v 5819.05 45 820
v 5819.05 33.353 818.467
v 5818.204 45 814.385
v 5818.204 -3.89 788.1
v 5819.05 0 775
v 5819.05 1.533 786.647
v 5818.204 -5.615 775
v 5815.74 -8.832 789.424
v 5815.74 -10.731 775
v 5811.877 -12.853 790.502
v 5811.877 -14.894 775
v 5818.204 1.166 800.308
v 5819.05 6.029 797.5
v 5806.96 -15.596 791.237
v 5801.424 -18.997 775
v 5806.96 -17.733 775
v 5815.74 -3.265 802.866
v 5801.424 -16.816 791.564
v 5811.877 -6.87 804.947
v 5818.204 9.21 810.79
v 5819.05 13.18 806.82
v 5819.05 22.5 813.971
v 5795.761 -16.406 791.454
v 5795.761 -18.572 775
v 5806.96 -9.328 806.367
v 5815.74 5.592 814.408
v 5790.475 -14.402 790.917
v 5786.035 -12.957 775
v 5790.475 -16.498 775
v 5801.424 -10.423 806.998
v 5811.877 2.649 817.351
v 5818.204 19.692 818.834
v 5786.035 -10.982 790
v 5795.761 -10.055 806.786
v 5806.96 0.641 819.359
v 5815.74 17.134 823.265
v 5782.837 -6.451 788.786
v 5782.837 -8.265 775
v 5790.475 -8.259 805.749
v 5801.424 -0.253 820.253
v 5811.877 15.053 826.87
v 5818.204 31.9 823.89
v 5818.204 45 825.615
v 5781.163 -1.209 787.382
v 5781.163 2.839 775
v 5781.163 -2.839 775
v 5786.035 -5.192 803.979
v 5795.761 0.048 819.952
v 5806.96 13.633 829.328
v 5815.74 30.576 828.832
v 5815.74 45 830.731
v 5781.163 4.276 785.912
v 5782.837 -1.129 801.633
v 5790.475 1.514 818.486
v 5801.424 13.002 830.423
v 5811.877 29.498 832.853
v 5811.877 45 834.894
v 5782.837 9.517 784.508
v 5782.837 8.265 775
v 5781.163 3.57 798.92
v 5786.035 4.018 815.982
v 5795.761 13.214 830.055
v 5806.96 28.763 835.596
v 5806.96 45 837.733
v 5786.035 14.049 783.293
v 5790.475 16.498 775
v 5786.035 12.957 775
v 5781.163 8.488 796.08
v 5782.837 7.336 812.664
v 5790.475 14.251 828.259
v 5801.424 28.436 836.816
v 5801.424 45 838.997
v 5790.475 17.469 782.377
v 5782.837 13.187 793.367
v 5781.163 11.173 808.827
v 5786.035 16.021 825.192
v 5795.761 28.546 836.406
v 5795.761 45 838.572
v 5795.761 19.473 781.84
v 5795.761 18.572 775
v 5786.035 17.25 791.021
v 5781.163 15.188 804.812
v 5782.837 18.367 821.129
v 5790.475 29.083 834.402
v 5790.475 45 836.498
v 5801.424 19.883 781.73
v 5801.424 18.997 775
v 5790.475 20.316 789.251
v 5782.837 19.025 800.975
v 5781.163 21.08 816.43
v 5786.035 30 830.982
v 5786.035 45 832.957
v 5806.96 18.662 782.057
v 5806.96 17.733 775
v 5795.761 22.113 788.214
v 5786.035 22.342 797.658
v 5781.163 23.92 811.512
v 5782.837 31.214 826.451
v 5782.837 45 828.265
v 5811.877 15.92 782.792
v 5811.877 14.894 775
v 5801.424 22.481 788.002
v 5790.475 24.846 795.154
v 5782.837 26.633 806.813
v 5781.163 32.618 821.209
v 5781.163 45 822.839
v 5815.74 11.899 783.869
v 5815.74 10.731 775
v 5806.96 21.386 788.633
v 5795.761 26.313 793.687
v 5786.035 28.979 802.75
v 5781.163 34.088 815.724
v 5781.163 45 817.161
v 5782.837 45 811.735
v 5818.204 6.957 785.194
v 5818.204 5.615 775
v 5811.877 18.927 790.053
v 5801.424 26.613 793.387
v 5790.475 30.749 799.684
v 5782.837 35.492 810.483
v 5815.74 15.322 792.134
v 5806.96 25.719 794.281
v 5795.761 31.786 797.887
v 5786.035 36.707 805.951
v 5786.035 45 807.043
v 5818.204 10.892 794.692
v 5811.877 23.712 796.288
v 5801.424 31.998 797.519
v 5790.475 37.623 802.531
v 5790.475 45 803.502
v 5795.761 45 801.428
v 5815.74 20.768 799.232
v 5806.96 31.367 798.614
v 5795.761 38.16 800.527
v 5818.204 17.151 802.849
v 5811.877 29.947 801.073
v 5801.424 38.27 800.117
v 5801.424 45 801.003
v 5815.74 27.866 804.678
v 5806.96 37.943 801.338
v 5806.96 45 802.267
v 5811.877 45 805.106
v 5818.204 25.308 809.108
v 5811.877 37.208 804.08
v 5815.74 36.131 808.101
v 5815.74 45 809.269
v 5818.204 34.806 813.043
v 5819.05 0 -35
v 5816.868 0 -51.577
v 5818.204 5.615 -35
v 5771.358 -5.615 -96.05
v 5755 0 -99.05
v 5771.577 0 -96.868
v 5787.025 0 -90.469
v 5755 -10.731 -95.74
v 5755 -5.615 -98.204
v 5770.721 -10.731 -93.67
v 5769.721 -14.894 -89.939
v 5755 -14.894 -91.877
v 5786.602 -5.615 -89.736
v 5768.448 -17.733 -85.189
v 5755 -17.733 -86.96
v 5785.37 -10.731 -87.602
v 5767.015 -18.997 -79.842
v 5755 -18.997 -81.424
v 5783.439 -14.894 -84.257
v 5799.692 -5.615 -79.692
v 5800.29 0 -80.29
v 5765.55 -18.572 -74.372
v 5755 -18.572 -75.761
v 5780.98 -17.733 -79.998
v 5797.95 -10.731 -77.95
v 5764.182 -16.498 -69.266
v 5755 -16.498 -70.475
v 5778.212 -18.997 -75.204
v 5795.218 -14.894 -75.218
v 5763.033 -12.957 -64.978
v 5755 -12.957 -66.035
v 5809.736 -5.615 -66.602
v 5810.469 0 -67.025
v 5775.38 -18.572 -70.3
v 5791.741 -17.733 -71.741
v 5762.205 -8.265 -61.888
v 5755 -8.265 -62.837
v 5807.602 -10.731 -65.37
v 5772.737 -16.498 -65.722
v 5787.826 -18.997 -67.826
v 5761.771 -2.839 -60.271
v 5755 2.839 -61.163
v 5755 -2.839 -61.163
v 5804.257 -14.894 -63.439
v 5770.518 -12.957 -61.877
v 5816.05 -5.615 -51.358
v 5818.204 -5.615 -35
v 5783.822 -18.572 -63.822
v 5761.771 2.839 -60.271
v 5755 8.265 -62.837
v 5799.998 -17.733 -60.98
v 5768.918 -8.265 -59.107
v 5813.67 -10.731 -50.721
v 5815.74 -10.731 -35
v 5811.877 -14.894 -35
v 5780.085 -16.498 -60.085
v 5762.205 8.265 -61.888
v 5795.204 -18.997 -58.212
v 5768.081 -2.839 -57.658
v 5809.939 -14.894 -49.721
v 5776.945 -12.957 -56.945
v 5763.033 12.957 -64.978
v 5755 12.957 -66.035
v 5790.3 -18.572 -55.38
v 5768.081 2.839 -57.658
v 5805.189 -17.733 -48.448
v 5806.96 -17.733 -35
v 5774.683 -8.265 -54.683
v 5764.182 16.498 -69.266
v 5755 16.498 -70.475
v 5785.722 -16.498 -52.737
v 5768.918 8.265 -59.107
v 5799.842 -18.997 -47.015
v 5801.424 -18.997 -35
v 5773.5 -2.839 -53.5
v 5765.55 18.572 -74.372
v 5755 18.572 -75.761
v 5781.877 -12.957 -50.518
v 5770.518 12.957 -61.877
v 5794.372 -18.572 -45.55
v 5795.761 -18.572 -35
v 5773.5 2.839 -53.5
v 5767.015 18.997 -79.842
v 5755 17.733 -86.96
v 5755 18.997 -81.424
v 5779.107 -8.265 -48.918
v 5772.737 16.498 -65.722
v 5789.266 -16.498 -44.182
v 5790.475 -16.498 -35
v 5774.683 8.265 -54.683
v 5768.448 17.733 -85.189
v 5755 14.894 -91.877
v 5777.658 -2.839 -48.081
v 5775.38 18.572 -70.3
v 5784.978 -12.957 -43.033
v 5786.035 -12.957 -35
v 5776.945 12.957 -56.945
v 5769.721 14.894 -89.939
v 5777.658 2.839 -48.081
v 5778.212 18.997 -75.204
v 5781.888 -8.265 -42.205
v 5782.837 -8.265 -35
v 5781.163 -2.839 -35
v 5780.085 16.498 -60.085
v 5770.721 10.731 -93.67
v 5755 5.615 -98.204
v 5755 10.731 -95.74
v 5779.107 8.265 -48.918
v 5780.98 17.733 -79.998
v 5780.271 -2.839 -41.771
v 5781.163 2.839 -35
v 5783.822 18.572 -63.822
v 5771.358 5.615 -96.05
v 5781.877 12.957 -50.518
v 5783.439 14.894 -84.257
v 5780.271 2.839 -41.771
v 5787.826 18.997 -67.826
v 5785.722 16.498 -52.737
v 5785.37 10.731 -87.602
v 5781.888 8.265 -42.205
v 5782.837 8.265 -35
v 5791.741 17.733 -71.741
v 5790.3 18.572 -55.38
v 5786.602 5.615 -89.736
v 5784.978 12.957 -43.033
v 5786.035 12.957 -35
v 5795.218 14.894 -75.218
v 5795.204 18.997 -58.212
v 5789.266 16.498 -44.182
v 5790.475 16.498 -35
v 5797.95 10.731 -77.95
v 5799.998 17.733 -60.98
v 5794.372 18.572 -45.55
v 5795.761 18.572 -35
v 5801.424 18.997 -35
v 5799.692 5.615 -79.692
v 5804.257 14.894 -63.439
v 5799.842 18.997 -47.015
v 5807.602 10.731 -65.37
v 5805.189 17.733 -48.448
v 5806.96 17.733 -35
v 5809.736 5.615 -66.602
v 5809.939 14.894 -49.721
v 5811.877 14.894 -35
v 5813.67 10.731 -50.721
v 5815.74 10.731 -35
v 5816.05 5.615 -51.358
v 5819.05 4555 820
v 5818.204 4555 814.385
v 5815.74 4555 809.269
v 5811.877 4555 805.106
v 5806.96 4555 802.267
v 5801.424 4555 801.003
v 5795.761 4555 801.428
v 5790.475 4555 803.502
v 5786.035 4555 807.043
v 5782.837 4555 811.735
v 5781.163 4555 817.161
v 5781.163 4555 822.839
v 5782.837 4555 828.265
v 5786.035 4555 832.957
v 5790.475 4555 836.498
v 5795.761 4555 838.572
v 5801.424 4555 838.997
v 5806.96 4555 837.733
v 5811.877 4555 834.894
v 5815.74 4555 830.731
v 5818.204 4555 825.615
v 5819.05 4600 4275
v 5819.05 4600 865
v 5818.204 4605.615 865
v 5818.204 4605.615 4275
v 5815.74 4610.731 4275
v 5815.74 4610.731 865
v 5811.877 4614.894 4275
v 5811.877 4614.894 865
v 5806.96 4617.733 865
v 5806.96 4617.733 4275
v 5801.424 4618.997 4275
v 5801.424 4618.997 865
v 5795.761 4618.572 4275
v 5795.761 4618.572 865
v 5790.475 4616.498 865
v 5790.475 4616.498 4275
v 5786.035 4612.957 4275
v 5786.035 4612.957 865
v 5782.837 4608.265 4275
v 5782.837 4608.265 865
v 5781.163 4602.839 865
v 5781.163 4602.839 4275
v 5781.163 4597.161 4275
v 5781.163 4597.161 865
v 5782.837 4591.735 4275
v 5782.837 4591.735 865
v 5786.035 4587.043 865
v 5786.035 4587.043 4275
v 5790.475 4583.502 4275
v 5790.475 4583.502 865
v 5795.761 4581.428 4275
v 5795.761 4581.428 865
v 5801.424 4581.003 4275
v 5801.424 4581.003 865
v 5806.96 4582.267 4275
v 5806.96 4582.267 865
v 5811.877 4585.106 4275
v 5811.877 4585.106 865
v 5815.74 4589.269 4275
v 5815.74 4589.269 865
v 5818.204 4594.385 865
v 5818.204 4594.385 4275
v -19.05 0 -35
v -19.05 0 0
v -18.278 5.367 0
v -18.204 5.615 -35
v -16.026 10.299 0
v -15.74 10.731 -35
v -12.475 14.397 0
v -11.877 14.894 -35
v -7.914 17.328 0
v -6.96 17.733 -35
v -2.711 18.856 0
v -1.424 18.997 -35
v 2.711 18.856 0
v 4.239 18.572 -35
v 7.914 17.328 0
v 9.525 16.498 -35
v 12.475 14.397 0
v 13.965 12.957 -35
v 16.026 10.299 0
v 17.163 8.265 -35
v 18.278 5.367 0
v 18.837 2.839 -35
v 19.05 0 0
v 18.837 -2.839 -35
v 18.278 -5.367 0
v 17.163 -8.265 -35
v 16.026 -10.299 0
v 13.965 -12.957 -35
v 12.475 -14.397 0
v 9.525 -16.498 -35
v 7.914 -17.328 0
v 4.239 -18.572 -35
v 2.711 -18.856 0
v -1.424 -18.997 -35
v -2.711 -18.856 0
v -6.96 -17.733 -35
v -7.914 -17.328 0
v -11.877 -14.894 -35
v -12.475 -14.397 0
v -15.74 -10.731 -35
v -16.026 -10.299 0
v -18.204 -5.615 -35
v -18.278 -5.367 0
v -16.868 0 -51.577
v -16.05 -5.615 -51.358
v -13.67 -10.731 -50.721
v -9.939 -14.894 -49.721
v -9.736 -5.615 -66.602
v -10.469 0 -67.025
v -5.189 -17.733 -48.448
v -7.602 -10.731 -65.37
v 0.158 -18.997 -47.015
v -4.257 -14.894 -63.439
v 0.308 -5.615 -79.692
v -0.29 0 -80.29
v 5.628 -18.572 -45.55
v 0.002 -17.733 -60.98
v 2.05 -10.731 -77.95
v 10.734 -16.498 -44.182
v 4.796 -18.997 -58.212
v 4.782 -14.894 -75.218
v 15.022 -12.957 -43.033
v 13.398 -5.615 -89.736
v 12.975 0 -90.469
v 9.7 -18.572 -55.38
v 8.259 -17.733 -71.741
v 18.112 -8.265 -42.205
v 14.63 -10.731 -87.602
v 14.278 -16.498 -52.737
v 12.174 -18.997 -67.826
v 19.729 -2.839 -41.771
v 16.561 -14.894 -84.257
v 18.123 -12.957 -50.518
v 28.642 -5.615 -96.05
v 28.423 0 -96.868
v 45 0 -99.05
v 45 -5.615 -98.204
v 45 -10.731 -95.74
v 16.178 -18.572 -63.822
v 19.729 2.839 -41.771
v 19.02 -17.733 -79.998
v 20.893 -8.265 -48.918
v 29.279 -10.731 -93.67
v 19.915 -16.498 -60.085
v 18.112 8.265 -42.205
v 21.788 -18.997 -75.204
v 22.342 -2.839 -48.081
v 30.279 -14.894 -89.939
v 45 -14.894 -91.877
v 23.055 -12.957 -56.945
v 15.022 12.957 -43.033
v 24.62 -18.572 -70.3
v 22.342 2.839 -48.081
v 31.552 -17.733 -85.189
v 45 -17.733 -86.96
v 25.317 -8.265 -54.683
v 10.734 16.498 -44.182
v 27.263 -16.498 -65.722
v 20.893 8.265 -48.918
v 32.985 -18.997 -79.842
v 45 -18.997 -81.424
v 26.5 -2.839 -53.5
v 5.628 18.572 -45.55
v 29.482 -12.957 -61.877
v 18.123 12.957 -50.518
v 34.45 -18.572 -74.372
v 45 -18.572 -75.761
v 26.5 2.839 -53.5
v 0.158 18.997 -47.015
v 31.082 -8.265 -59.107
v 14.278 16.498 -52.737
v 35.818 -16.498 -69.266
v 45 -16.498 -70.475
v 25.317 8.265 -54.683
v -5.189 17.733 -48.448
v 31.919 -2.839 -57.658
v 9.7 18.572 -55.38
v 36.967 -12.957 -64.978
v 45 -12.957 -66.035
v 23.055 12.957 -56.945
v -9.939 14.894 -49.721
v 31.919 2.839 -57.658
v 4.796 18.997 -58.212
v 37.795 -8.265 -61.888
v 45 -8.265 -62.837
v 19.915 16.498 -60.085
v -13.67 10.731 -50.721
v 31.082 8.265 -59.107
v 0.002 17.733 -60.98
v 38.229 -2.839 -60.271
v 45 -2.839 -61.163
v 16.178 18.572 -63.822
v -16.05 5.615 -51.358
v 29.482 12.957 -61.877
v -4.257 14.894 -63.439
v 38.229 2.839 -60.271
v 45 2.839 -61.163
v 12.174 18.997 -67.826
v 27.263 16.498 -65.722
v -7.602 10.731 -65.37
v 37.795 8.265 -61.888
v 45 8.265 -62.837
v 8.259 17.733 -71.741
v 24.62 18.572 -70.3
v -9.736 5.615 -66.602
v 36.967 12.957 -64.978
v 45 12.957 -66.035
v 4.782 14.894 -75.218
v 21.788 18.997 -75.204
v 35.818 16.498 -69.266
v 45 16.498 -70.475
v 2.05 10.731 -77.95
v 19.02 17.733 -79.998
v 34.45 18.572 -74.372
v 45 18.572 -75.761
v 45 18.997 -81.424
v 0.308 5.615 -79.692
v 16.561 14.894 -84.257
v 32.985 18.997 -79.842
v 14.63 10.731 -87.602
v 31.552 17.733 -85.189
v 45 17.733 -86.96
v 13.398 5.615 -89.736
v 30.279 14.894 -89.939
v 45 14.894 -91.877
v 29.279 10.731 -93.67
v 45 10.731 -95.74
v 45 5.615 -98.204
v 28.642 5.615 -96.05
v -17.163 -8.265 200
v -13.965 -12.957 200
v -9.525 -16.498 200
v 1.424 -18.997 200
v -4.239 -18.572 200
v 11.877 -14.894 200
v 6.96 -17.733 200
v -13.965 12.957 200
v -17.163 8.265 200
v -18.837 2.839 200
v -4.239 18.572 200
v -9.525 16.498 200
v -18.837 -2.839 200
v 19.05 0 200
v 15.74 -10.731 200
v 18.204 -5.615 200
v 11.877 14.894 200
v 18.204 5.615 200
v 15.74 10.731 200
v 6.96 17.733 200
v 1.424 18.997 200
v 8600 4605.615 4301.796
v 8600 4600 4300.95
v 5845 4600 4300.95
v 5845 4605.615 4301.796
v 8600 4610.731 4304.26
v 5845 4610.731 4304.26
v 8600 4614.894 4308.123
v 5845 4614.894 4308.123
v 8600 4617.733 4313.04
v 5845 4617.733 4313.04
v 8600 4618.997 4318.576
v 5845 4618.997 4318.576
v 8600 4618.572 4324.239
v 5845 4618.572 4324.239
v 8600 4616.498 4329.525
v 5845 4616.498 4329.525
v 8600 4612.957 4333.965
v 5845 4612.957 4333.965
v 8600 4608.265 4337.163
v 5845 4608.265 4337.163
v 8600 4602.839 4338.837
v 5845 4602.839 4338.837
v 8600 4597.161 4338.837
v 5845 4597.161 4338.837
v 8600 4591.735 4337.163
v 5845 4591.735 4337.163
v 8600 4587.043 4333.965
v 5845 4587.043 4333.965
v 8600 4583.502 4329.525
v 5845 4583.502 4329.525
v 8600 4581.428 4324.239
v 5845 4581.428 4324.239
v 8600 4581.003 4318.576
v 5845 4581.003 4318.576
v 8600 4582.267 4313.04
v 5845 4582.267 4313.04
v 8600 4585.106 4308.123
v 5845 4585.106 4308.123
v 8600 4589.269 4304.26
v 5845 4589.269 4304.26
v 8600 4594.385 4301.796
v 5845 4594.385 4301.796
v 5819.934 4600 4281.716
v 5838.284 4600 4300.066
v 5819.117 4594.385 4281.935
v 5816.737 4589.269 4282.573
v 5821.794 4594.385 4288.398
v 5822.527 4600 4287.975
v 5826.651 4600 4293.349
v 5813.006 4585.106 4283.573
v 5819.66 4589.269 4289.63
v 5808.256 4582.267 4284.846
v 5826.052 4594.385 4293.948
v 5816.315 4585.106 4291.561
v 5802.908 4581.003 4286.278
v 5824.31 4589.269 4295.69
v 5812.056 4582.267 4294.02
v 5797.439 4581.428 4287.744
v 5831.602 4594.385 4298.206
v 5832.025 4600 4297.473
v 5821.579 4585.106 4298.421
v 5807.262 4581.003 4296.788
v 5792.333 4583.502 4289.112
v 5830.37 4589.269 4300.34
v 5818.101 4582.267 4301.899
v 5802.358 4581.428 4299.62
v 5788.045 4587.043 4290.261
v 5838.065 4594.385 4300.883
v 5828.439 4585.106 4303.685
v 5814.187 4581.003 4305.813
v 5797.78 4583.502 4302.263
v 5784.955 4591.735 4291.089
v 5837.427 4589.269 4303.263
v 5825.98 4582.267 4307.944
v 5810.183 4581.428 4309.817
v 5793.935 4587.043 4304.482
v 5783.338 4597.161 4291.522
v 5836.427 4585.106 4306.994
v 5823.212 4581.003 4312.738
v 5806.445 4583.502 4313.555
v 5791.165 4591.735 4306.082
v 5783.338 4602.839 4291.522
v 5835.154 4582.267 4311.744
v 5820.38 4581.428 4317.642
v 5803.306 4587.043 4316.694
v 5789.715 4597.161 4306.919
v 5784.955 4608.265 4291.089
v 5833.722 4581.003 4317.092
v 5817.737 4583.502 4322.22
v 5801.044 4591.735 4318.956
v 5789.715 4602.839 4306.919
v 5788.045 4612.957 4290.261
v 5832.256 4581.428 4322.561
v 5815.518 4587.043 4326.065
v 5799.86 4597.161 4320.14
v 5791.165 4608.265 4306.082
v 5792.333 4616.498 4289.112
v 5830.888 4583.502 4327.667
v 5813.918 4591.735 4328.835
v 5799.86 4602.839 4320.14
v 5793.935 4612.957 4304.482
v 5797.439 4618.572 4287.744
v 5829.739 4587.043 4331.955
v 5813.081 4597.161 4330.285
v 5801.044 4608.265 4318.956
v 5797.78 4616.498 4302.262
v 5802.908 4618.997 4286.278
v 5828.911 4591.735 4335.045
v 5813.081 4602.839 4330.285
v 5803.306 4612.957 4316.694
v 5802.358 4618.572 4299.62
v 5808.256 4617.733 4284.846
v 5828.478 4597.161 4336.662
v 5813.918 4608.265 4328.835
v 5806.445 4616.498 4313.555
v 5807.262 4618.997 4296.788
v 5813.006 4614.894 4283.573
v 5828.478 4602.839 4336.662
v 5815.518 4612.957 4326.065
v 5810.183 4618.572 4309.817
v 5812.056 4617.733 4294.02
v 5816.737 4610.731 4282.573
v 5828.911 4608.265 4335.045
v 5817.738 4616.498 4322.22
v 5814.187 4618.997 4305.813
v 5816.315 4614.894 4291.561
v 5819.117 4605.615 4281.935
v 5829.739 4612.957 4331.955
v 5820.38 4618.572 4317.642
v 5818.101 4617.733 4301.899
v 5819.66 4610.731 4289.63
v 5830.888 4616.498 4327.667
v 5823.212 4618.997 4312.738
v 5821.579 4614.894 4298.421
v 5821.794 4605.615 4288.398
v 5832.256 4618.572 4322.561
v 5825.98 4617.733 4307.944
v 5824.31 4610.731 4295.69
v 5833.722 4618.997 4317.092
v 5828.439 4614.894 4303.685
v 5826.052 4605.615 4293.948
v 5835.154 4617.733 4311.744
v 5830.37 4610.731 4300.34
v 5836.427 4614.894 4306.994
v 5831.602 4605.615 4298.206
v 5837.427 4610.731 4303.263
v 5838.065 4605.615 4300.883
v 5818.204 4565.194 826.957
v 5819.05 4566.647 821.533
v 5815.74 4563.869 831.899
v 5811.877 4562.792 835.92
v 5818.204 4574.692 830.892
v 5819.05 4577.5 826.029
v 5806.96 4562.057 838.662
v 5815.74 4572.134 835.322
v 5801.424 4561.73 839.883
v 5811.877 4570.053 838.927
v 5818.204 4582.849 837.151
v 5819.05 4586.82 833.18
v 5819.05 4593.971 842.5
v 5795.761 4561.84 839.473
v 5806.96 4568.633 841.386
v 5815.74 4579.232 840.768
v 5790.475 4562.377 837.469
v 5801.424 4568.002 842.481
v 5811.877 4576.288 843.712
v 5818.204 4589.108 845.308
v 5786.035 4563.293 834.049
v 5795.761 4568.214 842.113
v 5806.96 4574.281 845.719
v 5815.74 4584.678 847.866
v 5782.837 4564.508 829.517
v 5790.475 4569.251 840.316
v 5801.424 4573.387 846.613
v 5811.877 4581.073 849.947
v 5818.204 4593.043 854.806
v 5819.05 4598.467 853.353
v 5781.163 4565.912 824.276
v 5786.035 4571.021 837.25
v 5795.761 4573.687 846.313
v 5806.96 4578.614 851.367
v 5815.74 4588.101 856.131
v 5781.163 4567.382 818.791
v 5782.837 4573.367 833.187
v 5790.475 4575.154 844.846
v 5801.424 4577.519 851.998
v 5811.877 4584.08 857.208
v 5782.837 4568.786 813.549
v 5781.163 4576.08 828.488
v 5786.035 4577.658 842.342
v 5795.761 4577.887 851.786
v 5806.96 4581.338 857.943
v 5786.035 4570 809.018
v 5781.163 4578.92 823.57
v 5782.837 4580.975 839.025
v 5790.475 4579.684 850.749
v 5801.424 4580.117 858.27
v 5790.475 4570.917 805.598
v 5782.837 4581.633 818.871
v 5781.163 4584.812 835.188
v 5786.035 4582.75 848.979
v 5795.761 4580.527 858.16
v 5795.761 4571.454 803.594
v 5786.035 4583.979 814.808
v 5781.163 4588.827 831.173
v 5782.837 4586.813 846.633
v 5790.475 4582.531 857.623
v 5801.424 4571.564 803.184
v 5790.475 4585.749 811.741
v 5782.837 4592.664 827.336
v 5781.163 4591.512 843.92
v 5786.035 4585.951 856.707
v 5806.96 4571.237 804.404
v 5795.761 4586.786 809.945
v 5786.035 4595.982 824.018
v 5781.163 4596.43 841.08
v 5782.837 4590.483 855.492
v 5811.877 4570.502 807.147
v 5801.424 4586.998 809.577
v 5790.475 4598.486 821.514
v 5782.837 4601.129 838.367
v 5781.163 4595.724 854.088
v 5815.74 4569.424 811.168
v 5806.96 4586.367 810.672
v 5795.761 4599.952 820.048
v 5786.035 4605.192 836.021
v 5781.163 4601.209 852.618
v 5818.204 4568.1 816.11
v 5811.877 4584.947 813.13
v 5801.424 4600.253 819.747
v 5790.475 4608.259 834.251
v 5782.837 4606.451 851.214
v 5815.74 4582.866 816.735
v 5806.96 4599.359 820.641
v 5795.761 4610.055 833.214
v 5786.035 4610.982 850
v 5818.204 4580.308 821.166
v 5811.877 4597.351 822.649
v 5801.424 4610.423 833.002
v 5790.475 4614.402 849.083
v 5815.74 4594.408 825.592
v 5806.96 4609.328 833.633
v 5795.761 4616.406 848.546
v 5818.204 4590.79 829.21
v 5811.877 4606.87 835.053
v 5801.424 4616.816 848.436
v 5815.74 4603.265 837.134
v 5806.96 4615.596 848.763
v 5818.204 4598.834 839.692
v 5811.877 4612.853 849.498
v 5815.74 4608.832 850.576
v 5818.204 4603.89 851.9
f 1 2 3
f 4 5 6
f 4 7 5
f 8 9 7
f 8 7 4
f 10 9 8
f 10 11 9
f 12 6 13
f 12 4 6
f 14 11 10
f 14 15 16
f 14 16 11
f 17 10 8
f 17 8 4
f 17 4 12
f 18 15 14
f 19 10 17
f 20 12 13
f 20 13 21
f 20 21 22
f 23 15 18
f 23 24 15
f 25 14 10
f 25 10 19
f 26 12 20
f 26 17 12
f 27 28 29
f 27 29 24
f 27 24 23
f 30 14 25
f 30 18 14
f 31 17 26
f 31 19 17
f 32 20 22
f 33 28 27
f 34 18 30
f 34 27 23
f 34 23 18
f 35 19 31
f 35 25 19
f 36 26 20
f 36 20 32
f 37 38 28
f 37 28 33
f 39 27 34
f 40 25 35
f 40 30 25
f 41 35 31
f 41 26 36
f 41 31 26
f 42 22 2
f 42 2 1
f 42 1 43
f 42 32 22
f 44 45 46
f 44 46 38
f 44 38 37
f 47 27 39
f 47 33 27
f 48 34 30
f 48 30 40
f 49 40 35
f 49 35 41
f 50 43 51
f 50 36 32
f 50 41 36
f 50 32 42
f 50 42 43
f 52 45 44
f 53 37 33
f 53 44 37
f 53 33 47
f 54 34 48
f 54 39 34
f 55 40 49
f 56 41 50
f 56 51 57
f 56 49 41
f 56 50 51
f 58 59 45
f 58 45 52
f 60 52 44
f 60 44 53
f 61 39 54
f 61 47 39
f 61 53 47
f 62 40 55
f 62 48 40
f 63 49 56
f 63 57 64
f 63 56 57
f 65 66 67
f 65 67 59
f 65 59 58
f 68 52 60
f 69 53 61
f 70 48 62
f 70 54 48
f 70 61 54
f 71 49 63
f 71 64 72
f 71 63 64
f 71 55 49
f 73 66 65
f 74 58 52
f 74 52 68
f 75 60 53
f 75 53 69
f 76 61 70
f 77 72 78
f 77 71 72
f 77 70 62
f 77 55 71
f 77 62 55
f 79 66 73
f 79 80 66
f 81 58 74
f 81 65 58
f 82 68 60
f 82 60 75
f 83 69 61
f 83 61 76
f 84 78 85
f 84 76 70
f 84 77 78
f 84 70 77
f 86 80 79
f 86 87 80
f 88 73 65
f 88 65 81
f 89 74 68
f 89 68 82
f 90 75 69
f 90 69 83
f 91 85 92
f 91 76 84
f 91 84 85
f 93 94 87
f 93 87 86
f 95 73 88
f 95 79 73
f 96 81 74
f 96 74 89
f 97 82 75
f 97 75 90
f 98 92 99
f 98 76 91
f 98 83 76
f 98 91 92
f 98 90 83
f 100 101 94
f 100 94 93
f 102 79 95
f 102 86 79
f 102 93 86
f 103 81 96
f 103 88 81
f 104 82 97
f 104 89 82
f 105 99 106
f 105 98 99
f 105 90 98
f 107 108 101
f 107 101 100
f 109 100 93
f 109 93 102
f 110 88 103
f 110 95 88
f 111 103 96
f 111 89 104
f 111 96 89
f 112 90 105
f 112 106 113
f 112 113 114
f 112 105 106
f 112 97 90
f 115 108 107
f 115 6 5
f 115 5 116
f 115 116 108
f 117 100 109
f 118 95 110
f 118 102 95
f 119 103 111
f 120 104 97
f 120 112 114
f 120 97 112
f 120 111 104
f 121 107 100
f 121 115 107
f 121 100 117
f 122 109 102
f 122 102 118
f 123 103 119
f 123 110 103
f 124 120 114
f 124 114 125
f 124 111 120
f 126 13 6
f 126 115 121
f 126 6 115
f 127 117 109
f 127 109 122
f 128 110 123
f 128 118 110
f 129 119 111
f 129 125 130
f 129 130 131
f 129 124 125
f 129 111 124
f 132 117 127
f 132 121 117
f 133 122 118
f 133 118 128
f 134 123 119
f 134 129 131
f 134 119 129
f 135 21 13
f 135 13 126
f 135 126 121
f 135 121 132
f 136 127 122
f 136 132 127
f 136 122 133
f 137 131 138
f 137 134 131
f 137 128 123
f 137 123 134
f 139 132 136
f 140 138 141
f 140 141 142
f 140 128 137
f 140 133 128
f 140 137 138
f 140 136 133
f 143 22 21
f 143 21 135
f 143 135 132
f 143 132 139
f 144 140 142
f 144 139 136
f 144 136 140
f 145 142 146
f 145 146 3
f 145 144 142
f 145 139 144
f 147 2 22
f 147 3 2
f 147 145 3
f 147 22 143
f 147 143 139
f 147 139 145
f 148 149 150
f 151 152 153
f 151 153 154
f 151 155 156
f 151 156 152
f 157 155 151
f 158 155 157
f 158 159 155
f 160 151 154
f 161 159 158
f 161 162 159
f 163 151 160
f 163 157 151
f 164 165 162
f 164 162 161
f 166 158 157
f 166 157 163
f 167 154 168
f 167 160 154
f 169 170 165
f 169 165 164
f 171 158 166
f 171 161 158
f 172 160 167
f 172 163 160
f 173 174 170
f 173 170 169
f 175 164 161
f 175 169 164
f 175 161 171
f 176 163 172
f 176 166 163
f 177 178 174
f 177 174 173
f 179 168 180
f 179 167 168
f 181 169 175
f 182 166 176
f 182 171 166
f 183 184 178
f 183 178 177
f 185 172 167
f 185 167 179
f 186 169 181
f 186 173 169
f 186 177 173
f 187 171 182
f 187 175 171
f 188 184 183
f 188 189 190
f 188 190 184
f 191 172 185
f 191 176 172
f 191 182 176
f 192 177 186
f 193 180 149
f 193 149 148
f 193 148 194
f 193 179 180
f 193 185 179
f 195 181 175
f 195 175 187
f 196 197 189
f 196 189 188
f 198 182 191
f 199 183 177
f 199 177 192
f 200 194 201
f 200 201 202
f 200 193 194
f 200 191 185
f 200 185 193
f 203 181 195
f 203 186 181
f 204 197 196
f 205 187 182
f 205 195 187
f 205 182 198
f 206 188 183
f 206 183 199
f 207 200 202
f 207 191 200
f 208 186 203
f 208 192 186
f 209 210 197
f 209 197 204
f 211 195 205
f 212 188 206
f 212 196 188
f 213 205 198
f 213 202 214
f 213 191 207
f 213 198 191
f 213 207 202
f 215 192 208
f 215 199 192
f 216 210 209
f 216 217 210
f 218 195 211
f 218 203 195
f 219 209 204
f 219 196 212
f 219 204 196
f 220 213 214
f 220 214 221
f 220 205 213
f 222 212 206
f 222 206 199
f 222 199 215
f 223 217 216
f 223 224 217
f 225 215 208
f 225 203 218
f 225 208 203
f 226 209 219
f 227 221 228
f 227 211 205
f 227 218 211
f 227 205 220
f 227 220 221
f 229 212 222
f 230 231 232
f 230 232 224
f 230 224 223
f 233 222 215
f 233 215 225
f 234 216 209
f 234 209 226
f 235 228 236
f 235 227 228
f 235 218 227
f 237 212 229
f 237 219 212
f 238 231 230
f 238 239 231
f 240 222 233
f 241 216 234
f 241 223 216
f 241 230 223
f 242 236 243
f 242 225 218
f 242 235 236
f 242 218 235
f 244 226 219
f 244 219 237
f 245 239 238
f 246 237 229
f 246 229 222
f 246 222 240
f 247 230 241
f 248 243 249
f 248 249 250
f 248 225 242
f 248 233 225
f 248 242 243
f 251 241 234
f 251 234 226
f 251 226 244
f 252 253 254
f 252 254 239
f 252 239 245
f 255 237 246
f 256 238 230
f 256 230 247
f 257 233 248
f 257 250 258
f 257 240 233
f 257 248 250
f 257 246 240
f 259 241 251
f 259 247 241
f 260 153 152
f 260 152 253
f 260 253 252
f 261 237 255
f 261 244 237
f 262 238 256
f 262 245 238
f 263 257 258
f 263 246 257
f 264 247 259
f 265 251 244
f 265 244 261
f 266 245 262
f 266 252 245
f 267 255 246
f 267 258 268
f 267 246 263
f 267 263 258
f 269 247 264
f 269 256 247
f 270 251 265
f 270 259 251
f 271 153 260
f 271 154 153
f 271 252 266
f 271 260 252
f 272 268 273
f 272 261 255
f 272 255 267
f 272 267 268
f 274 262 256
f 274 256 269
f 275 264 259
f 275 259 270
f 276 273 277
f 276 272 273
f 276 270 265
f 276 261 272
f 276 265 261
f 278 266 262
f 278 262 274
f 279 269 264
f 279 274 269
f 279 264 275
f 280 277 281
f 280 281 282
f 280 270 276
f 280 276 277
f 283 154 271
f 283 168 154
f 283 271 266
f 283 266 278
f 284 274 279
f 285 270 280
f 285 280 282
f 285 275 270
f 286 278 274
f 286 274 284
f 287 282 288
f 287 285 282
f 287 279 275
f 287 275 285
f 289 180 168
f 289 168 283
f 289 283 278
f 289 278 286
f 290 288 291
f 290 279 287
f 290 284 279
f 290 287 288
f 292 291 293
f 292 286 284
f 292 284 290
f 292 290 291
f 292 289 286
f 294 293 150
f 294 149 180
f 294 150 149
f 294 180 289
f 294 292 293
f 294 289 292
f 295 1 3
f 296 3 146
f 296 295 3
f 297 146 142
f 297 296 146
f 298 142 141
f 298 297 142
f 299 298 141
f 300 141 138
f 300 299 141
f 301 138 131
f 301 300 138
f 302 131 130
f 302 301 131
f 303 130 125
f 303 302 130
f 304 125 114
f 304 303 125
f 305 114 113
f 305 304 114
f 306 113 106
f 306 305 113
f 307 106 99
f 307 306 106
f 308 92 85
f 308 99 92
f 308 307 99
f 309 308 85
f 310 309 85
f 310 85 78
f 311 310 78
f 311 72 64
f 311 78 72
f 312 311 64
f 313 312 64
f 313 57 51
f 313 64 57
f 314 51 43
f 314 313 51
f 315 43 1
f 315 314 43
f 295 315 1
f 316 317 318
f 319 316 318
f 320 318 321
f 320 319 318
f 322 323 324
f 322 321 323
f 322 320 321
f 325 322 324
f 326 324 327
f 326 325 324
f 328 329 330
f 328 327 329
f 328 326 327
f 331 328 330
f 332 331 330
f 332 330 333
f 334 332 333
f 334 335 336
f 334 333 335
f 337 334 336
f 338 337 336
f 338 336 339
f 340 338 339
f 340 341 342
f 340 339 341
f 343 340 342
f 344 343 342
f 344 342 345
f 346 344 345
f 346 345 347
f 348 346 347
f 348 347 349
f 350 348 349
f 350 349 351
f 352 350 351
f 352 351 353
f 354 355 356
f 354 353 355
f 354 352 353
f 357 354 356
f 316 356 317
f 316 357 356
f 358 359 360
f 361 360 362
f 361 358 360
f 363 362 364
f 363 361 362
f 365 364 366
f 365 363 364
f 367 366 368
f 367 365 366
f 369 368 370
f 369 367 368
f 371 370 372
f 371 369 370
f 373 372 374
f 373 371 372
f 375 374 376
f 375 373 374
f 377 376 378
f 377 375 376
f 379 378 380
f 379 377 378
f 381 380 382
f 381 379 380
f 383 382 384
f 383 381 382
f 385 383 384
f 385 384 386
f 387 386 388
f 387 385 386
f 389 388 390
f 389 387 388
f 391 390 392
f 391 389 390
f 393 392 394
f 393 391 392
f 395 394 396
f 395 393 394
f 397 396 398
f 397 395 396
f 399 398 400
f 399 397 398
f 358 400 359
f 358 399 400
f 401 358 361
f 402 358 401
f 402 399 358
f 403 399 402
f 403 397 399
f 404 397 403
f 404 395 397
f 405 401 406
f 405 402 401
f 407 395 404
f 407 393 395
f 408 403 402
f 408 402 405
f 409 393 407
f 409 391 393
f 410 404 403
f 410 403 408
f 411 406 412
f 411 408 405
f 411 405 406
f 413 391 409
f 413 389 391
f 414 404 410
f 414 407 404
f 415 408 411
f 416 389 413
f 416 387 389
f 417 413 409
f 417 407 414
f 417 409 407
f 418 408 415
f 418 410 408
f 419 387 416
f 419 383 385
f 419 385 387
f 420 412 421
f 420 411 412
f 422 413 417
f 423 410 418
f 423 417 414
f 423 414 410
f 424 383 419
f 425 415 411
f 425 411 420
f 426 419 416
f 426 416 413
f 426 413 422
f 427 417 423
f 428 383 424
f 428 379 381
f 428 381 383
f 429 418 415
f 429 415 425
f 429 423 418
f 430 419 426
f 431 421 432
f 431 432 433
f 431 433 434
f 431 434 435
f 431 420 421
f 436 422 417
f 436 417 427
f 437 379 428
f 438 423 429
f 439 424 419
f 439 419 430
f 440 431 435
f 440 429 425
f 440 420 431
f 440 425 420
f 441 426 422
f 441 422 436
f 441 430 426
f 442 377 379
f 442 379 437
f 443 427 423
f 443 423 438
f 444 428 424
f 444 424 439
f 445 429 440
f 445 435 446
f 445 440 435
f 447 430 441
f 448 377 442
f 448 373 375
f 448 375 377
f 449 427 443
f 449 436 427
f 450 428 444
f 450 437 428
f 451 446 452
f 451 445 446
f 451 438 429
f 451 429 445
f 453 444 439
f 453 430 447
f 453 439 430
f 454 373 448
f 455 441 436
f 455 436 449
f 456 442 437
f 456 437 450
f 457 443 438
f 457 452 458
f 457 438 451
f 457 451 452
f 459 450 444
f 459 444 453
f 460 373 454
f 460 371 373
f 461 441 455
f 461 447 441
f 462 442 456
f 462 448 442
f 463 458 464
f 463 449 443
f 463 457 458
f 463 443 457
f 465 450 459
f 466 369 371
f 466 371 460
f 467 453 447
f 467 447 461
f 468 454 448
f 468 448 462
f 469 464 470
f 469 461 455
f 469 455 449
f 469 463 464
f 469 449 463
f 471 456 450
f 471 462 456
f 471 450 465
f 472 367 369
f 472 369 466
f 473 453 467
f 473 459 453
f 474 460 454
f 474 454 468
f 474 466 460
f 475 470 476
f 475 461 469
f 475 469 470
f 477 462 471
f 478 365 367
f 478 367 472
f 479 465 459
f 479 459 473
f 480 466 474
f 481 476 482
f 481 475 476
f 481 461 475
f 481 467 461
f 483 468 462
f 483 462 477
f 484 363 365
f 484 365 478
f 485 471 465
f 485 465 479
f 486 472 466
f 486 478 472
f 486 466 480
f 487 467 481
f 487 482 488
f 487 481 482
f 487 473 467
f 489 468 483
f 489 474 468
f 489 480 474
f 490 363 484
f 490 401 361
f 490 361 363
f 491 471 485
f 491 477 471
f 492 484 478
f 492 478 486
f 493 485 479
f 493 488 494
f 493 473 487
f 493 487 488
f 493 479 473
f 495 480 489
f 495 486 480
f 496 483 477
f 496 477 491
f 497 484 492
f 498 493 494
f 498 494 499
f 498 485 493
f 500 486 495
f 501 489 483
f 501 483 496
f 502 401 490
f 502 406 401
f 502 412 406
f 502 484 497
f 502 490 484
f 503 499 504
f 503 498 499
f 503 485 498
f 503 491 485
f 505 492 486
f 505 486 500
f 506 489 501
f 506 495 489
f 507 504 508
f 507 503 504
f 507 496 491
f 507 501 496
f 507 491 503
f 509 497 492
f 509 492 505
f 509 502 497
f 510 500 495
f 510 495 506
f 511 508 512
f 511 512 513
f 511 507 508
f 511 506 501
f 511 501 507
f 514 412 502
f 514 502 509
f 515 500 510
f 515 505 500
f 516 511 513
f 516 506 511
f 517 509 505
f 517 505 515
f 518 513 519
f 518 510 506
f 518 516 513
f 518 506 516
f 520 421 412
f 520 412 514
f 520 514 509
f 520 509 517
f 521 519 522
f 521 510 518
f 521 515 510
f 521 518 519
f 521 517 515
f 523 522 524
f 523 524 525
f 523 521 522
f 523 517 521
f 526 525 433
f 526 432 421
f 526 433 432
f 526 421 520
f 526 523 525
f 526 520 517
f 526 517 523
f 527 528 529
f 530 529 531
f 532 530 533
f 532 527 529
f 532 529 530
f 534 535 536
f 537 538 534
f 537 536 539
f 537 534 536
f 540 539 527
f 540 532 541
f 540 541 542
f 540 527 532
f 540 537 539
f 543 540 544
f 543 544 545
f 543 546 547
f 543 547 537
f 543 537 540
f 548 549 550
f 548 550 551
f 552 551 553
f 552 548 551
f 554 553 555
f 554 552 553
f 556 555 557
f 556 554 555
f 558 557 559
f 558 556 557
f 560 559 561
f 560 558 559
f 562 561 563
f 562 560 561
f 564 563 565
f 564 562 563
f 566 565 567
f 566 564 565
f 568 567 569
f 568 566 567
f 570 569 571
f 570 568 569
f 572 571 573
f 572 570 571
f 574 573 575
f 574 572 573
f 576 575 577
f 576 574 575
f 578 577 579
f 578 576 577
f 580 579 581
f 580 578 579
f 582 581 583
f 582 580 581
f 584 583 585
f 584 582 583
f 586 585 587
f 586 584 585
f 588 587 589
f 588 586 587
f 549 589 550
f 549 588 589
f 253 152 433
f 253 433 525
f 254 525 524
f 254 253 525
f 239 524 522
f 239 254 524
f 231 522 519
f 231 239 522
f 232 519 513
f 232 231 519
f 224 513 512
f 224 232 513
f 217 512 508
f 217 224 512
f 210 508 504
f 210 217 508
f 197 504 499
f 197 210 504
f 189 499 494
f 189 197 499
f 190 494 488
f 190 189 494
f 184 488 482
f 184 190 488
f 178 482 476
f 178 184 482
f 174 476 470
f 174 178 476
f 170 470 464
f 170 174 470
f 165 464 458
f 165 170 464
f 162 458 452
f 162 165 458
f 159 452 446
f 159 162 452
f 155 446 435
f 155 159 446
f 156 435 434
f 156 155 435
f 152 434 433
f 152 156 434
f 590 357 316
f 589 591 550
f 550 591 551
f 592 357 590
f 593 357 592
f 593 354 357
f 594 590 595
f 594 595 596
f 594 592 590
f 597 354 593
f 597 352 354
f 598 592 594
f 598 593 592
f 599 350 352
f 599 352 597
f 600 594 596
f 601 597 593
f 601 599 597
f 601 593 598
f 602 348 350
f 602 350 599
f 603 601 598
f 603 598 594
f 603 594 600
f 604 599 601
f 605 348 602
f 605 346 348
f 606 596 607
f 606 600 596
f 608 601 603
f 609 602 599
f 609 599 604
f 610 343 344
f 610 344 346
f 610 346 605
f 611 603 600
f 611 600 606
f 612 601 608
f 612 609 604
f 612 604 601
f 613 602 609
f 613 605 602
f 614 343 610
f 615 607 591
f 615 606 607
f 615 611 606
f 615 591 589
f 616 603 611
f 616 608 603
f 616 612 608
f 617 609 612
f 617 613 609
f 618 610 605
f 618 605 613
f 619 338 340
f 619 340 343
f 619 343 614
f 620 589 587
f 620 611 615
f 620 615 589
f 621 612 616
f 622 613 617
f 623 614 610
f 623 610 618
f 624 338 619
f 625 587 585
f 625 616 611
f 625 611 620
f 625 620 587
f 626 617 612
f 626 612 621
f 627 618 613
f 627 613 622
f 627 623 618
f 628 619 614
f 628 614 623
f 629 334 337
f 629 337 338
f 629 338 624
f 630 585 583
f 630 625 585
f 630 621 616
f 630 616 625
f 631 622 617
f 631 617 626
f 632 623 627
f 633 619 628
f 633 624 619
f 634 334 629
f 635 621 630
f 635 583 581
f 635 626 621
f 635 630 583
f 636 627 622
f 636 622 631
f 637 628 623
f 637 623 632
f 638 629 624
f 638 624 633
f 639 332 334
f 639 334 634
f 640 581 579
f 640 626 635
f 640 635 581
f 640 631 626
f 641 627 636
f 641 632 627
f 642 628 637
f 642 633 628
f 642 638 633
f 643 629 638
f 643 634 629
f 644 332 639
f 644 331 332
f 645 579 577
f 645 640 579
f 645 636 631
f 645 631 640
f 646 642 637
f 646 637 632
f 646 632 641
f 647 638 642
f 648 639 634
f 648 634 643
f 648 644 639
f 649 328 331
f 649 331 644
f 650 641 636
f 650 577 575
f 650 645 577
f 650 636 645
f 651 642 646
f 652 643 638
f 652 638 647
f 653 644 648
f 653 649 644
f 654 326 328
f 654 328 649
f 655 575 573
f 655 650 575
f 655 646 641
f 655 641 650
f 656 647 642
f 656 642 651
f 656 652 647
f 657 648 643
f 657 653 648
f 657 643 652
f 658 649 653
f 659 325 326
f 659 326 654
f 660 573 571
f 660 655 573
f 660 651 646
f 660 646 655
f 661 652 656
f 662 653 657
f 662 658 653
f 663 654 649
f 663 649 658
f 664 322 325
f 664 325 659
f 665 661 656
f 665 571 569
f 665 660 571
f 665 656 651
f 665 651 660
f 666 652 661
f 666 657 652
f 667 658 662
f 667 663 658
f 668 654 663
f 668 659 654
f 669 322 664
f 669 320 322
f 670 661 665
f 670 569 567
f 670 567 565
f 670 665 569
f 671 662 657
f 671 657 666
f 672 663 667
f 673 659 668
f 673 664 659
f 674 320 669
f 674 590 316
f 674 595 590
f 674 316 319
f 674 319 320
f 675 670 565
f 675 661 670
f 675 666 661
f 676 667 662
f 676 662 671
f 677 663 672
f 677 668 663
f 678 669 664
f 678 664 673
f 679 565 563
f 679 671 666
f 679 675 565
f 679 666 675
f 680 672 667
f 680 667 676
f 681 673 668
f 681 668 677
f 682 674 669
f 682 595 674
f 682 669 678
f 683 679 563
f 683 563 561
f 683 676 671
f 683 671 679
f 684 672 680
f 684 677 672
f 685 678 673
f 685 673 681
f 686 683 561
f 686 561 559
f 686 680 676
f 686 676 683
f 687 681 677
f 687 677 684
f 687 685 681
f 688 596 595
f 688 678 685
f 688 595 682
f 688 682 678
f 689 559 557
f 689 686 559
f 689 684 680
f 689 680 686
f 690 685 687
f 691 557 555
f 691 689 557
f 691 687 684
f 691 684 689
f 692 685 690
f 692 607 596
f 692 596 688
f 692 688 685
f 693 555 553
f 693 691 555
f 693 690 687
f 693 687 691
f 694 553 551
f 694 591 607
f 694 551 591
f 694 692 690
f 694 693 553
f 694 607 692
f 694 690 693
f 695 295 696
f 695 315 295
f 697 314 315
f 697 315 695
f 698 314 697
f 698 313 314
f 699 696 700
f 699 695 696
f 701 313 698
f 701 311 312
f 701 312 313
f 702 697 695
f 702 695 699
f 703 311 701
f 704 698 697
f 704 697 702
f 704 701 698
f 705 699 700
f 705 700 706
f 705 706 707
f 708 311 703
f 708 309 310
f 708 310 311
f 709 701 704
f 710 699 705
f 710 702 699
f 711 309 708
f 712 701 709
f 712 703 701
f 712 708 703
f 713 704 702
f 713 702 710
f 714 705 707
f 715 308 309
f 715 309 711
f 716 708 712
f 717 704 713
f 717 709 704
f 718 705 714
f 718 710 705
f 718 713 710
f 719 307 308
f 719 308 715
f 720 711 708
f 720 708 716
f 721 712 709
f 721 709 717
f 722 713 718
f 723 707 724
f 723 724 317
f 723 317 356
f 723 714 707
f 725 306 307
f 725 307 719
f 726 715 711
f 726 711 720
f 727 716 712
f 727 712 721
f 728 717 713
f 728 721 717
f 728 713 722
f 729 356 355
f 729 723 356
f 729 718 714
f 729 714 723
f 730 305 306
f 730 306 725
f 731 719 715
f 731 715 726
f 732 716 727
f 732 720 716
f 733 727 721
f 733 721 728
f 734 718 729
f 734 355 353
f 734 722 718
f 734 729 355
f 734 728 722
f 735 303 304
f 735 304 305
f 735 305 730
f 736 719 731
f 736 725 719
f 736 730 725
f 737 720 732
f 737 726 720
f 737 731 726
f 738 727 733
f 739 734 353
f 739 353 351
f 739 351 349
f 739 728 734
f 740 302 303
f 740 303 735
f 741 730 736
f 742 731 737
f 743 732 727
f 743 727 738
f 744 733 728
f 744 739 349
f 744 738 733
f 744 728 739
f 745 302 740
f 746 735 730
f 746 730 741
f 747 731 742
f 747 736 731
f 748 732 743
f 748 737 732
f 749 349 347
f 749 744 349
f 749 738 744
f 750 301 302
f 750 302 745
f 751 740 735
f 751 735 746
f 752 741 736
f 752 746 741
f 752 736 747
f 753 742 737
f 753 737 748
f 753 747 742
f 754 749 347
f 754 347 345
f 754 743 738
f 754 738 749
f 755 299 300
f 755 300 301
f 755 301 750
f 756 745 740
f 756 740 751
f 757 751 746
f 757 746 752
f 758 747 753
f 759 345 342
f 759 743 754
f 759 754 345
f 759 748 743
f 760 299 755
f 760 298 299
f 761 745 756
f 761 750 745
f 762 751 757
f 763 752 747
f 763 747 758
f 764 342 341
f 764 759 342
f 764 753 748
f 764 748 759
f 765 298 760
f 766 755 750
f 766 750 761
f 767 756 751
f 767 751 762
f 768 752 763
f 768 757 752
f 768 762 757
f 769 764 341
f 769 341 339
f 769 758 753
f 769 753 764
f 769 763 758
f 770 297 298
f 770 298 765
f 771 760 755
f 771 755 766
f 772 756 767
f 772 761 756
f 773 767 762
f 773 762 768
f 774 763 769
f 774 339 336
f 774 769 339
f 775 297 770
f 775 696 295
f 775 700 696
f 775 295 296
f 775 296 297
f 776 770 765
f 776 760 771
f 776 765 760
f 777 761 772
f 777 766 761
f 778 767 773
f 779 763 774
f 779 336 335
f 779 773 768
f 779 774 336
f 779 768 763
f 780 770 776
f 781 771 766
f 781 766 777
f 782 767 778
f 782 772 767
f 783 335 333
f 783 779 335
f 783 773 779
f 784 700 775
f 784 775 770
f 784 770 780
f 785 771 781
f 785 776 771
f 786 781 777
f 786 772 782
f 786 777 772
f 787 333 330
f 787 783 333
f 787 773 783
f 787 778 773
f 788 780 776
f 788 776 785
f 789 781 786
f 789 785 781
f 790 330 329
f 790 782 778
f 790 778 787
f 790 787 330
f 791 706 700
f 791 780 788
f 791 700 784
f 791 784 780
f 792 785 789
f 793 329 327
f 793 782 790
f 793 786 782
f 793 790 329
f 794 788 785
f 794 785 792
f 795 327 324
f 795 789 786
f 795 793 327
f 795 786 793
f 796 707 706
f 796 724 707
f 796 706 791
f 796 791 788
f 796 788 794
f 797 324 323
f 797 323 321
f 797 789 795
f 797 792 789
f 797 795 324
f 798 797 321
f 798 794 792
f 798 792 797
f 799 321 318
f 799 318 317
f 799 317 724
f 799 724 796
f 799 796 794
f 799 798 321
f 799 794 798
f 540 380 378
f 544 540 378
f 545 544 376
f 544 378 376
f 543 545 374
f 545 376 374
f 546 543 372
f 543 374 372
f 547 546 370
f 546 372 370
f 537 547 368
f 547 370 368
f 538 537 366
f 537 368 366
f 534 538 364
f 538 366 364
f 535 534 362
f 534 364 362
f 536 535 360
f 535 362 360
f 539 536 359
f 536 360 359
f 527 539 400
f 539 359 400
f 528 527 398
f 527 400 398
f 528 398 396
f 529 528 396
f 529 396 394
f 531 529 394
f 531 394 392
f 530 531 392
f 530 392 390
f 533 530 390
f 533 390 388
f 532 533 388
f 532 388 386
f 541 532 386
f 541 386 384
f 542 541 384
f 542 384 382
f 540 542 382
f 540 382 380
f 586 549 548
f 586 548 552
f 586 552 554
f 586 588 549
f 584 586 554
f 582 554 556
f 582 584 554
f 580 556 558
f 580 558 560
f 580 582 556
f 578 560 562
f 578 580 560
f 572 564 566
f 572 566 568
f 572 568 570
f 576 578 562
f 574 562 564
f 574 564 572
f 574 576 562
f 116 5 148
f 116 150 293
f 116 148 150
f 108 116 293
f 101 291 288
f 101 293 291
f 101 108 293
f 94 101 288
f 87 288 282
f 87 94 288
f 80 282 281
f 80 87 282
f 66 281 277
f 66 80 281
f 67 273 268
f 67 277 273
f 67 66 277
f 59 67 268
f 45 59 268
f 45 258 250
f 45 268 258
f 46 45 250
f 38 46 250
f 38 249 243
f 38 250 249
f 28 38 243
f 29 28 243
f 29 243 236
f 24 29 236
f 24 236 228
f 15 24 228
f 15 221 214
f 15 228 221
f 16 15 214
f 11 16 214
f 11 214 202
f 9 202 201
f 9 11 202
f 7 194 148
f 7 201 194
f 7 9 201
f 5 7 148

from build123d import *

# Parameters (mm, degrees)
CROQUIS1_R              = 19.05
SALIENTE_EXTRUIR1_DEPTH = 200
CROQUIS2_R              = 19.05


with BuildPart() as part:
    # Croquis1 → Saliente-Extruir1 (new body)
    with BuildSketch(Plane.XY):
        Circle(CROQUIS1_R)
    extrude(amount=SALIENTE_EXTRUIR1_DEPTH)

    # Barrer1: sweep along a curve in space
    with BuildLine() as barrer1_path:
        Line((0, 0, 0), (0, 0, -35))
        ThreePointArc((0, 0, -35), (13.180194847, 0, -66.819805153), (45, 0, -80))
        Line((45, 0, -80), (5755, 0, -80))
        ThreePointArc((5755, 0, -80), (5786.819805153, 0, -66.819805153), (5800, 0, -35))
        Line((5800, 0, -35), (5800, 0, 775))
        ThreePointArc((5800, 0, 775), (5800, 13.180194847, 806.819805153), (5800, 45, 820))
        Line((5800, 45, 820), (5800, 4555, 820))
        ThreePointArc((5800, 4555, 820), (5800, 4586.819805153, 833.180194847), (5800, 4600, 865))
        Line((5800, 4600, 865), (5800, 4600, 4275))
        ThreePointArc((5800, 4600, 4275), (5813.180194847, 4600, 4306.819805153), (5845, 4600, 4320))
        Line((5845, 4600, 4320), (8600, 4600, 4320))
    # Croquis2 → Barrer1 (sweep)
    with BuildSketch(Plane(origin=(0, 0, 0), x_dir=(-1, 0, 0), z_dir=(0, 0, -1))):
        Circle(CROQUIS2_R)
    sweep(path=barrer1_path.line)


solid = part.part
